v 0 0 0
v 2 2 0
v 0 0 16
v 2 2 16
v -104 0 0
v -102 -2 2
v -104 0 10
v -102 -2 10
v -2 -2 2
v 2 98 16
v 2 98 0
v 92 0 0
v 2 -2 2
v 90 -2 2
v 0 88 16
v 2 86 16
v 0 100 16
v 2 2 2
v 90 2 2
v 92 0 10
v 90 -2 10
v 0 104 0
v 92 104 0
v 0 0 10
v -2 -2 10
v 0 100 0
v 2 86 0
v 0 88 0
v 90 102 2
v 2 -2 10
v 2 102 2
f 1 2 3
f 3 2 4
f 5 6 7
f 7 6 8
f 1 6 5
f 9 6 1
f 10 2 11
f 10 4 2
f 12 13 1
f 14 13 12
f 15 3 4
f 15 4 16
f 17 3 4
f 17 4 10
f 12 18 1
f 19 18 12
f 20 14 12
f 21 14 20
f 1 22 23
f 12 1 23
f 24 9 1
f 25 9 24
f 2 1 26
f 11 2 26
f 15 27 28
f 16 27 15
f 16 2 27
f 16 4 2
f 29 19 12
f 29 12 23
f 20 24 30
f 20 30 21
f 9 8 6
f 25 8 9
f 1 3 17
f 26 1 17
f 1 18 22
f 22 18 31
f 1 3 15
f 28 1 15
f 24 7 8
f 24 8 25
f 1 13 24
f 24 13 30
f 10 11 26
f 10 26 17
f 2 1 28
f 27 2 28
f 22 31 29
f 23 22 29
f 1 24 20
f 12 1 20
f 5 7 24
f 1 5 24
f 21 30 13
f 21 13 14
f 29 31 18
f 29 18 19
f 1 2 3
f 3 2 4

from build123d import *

# Parameters (mm, degrees)
F0_W      = 92
F0_H      = 104
F1_DEPTH  = 2
F2_SIZE   = 1.99999
F3_W      = 104
F3_H      = 10
F4_DEPTH  = 2
F5_SIZE   = 1.99999
F6_W      = 92
F6_H      = 10
F7_DEPTH  = 2
F8_SIZE   = 1.99999
F9_W      = 100
F9_H      = 16
F10_DEPTH = 2
F11_SIZE  = 1.99999
F12_W     = 88
F12_H     = 16
F13_DEPTH = 2
F14_SIZE  = 1.99999


# Not quite as in the source:
# - a fillet or chamfer is up to 0.001 mm smaller than in the source, because OpenCascade refuses the exact size


with BuildPart() as f1:
    # F0 (on Top) → F1 (new body)
    with BuildSketch(Plane.XY):
        with Locations((46, 52)):
            Rectangle(F0_W, F0_H)
    extrude(amount=F1_DEPTH)

    # F2 (size 2 in the source; OpenCascade refuses exactly that, so slightly less here)
    f2_edges = [f1.edges().sort_by_distance(p)[0] for p in [
        (0, 52, 2),
        (46, 0, 2),
        (92, 52, 2),
        (46, 104, 2),
    ]]
    chamfer(f2_edges, length=F2_SIZE)


with BuildPart() as f4:
    # F3 (on Front) → F4 (new body)
    with BuildSketch(Plane.XZ):
        with Locations((-52, 5)):
            Rectangle(F3_W, F3_H)
    extrude(amount=F4_DEPTH)

    # F5 (size 2 in the source; OpenCascade refuses exactly that, so slightly less here)
    f5_edges = [f4.edges().sort_by_distance(p)[0] for p in [
        (-52, -2, 0),
        (0, -2, 5),
        (-104, -2, 5),
    ]]
    chamfer(f5_edges, length=F5_SIZE)


with BuildPart() as f7:
    # F6 (on Front) → F7 (new body)
    with BuildSketch(Plane.XZ):
        with Locations((46, 5)):
            Rectangle(F6_W, F6_H)
    extrude(amount=F7_DEPTH)

    # F8 (size 2 in the source; OpenCascade refuses exactly that, so slightly less here)
    f8_edges = [f7.edges().sort_by_distance(p)[0] for p in [
        (0, -2, 5),
        (46, -2, 0),
        (92, -2, 5),
    ]]
    chamfer(f8_edges, length=F8_SIZE)


with BuildPart() as f10:
    # F9 (on Right) → F10 (new body)
    with BuildSketch(Plane.YZ):
        with Locations((50, 8)):
            Rectangle(F9_W, F9_H)
    extrude(amount=F10_DEPTH)

    # F11 (size 2 in the source; OpenCascade refuses exactly that, so slightly less here)
    f11_edges = [f10.edges().sort_by_distance(p)[0] for p in [
        (2, 100, 8),
        (2, 0, 8),
    ]]
    chamfer(f11_edges, length=F11_SIZE)


with BuildPart() as f13:
    # F12 (on Right) → F13 (new body)
    with BuildSketch(Plane.YZ):
        with Locations((44, 8)):
            Rectangle(F12_W, F12_H)
    extrude(amount=F13_DEPTH)

    # F14 (size 2 in the source; OpenCascade refuses exactly that, so slightly less here)
    f14_edges = [f13.edges().sort_by_distance(p)[0] for p in [
        (2, 0, 8),
        (2, 88, 8),
    ]]
    chamfer(f14_edges, length=F14_SIZE)


solid = Compound([f1.part, f4.part, f7.part, f10.part, f13.part])
